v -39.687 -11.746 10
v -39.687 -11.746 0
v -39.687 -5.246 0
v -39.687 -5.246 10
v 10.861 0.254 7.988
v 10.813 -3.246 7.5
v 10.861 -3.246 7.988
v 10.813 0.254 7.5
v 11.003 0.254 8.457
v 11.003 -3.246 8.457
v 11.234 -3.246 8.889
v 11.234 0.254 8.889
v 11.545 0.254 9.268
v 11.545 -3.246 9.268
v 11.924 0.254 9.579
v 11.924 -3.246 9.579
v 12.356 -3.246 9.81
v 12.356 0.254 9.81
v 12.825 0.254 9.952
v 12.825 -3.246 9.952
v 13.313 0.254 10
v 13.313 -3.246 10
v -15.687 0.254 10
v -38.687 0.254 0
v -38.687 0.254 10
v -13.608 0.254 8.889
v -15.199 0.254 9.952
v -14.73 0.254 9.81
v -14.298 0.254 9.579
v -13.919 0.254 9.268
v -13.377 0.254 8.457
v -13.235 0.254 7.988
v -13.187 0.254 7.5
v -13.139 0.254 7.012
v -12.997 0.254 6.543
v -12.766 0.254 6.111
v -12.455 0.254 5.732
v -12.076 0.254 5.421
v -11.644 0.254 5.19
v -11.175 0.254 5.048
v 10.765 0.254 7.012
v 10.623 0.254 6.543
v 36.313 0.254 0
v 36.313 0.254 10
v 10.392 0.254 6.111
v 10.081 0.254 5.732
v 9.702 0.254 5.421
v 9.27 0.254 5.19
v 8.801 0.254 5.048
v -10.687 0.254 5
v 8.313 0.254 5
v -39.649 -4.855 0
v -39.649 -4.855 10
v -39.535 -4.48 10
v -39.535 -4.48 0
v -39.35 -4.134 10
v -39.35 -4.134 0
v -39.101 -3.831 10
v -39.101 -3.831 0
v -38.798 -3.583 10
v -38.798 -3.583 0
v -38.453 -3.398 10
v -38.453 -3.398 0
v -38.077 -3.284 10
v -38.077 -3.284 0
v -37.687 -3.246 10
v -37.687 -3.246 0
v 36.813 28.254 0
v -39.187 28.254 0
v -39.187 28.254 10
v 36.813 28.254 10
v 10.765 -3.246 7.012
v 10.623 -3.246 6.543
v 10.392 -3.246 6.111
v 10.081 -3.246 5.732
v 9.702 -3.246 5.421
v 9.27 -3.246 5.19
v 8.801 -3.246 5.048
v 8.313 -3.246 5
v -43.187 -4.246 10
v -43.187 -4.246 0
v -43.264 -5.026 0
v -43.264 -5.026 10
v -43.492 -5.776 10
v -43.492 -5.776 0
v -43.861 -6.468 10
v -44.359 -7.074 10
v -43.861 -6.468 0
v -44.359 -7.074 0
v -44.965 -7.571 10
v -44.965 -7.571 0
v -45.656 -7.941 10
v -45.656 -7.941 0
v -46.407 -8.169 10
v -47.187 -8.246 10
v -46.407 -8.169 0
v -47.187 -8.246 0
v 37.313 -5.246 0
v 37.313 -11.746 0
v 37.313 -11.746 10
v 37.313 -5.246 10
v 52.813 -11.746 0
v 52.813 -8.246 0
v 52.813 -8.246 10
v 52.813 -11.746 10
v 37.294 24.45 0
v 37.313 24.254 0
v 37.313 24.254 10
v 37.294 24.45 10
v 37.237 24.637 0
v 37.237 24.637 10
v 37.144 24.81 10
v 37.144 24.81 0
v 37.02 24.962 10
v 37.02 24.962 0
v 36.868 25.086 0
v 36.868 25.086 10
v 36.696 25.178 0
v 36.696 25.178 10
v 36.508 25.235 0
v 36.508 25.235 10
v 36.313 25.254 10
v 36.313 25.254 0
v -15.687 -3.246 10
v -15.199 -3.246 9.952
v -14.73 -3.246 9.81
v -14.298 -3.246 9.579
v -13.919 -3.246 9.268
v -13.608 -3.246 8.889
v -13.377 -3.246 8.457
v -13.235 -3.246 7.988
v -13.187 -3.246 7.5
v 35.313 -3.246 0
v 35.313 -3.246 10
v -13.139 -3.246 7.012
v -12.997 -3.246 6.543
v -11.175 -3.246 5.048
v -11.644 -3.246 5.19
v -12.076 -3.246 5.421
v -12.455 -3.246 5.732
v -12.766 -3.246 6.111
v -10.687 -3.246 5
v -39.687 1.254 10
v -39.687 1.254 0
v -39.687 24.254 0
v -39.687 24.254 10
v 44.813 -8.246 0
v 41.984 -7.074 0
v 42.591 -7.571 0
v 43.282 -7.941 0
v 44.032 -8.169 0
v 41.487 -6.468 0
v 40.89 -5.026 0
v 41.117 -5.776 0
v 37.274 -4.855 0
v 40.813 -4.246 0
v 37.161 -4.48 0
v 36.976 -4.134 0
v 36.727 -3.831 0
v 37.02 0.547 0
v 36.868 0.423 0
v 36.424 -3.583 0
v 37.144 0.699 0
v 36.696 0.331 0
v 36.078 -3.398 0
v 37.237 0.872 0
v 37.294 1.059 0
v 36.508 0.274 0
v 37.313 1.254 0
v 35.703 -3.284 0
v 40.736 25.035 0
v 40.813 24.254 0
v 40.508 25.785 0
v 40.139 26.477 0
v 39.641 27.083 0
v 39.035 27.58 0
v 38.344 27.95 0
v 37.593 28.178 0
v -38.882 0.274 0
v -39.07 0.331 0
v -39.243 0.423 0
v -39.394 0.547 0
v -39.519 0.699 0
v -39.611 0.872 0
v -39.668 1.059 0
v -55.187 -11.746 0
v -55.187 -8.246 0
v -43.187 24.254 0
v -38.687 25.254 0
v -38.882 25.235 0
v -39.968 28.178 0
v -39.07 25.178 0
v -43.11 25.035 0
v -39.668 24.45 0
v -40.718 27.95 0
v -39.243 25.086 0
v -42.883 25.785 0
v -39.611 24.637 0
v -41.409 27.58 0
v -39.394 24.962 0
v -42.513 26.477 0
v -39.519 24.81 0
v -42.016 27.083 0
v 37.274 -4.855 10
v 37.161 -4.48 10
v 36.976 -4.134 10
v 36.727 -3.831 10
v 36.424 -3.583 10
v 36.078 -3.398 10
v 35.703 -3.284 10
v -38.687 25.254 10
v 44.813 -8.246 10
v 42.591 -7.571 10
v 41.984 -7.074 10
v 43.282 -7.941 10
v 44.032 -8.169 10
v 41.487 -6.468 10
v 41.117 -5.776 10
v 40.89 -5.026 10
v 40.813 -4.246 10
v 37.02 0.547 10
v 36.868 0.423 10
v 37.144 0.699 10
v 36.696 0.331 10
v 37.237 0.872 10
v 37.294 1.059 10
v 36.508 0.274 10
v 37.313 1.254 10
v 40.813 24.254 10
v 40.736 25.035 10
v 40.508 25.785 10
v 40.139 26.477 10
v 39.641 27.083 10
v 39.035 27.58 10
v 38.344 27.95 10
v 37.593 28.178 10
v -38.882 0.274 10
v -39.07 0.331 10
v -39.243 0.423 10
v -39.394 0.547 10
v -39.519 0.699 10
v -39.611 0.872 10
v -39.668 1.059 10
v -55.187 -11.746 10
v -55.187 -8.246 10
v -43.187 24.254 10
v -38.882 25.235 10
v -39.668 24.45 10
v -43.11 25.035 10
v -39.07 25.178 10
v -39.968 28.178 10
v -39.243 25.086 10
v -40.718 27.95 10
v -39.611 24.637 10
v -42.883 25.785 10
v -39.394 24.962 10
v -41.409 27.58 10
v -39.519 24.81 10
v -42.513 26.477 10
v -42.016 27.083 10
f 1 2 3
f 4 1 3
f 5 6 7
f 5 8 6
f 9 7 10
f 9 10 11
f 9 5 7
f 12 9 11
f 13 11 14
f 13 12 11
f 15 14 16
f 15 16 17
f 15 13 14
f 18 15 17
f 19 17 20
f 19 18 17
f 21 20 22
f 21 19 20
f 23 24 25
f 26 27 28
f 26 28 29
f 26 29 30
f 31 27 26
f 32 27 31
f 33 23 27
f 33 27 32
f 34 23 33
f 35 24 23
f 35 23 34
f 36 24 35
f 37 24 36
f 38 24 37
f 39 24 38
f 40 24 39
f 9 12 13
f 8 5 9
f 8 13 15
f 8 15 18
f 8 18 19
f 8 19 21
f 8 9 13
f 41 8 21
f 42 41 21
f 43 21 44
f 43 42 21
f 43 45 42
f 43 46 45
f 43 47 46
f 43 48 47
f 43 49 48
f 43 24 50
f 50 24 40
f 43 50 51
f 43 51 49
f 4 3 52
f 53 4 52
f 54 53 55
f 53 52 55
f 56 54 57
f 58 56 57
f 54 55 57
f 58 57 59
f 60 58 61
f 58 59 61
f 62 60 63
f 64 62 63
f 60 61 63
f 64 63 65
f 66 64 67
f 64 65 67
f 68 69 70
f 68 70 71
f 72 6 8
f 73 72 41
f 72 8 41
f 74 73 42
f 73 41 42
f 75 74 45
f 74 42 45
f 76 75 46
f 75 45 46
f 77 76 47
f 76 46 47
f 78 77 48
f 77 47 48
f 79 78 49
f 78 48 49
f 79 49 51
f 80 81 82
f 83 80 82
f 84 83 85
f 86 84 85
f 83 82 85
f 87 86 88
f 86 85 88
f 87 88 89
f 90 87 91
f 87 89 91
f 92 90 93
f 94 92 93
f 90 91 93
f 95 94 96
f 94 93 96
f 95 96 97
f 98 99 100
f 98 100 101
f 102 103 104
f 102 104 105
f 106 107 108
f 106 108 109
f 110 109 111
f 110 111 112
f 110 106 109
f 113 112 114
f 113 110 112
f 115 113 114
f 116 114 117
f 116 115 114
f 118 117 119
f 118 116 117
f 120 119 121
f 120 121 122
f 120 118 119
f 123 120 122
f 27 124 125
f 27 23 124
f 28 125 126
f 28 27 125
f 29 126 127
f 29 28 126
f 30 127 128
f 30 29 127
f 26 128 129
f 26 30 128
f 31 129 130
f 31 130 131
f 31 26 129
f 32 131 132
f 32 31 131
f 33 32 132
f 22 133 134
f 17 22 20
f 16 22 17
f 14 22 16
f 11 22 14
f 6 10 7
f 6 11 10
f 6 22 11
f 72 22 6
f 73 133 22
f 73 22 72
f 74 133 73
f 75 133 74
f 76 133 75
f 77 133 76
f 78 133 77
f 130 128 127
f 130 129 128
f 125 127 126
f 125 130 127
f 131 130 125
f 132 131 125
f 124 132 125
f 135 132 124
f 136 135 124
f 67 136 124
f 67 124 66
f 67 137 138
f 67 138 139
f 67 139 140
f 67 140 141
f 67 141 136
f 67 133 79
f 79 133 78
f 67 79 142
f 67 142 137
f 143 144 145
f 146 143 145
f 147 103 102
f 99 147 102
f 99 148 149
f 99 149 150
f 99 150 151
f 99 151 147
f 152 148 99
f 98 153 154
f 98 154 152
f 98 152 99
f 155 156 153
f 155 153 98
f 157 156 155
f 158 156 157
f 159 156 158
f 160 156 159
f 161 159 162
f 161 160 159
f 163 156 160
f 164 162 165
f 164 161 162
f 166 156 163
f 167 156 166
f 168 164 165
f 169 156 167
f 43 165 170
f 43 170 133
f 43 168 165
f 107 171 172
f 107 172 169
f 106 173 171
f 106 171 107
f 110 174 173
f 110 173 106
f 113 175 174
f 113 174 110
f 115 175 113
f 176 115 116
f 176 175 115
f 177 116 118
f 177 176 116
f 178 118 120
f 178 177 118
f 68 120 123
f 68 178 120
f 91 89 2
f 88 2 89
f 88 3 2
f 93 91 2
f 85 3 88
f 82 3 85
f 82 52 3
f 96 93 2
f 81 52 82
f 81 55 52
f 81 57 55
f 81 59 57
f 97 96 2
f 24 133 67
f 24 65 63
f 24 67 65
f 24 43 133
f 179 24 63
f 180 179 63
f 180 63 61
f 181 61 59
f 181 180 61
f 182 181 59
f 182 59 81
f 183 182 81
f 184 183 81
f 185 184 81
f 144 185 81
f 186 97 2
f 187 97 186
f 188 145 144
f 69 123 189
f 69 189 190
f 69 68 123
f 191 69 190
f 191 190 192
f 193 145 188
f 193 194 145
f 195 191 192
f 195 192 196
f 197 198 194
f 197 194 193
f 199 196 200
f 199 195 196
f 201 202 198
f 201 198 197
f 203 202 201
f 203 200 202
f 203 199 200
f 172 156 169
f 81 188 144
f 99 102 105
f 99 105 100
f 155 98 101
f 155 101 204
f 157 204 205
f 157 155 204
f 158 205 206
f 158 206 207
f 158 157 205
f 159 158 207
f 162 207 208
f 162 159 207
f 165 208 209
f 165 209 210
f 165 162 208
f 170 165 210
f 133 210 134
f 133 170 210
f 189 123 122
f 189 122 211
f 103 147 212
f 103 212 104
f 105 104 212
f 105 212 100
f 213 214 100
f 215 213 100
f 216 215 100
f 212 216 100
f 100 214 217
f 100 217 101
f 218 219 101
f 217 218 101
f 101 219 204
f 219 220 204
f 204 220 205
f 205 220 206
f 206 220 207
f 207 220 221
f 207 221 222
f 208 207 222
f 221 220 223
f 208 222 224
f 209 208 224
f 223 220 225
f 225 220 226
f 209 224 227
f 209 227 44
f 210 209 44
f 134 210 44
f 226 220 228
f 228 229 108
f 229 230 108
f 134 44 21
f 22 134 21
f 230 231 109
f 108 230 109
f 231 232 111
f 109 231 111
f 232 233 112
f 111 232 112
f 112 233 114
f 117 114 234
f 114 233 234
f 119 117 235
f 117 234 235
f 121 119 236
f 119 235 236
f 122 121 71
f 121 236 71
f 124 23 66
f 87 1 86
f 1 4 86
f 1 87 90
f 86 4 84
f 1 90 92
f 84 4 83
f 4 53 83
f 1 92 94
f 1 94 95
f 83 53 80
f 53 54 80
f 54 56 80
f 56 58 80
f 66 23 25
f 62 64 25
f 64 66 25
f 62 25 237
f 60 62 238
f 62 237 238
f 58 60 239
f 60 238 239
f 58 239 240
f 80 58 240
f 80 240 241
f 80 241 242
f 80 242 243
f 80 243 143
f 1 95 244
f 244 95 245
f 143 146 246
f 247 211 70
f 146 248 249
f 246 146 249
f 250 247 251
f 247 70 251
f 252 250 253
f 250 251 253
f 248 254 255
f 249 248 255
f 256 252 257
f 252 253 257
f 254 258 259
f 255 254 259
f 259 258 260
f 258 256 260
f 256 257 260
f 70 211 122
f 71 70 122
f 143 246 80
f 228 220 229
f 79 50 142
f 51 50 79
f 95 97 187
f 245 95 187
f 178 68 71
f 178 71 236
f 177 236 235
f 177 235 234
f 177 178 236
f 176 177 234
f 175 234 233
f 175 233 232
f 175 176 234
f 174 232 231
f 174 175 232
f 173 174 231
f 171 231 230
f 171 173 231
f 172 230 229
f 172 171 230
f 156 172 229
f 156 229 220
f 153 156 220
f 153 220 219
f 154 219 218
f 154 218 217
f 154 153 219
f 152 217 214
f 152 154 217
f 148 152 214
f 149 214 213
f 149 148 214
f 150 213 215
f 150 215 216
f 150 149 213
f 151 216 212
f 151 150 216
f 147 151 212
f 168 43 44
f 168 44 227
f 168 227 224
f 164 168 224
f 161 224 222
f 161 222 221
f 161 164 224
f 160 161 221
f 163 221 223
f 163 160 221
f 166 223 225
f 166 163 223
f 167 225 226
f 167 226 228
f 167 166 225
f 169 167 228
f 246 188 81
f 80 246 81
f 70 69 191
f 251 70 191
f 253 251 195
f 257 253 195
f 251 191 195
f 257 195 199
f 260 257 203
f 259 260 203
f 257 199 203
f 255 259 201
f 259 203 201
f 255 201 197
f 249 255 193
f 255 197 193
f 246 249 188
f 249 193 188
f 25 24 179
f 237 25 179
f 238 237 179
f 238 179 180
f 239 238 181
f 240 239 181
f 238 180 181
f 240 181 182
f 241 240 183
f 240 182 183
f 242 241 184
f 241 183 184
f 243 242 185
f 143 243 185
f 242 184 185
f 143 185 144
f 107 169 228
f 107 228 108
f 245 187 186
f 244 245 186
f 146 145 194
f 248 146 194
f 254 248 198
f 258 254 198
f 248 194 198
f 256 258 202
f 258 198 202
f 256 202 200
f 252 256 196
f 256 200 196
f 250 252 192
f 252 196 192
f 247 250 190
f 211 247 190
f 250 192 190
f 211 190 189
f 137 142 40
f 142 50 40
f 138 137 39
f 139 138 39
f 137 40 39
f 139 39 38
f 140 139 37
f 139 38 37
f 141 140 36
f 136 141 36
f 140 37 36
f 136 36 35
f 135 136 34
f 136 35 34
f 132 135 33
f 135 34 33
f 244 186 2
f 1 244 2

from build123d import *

# Parameters (mm, degrees)
SALIENTE_EXTRUIR2_DEPTH = 10
CROQUIS9_W              = 24
CROQUIS9_H              = 7
CORTAR_EXTRUIR2_DEPTH   = 5
REDONDEO3_R             = 2.5


with BuildPart() as part:
    # Croquis1 → Saliente-Extruir2 (new body)
    with BuildSketch(Plane.XY):
        with BuildLine():
            ThreePointArc((-38.687161159, 0.254415054), (-39.39426794, 0.547308273), (-39.687161159, 1.254415054))
            Line((-39.687161159, 1.254415054), (-39.687161159, 24.254415054))
            ThreePointArc((-39.687161159, 24.254415054), (-39.39426794, 24.961521836), (-38.687161159, 25.254415054))
            Line((-38.687161159, 25.254415054), (-1.187161159, 25.254415054))
            Line((-1.187161159, 25.254415054), (-1.187161159, 28.254415054))
            Line((-1.187161159, 28.254415054), (-39.187161159, 28.254415054))
            ThreePointArc((-39.187161159, 28.254415054), (-42.015588284, 27.082842179), (-43.187161159, 24.254415054))
            Line((-43.187161159, 24.254415054), (-43.187161159, -3.245584946))
            Line((-43.187161159, -3.245584946), (-43.187161159, -4.245584946))
            ThreePointArc((-43.187161159, -4.245584946), (-44.358734034, -7.07401207), (-47.187161159, -8.245584946))
            Line((-47.187161159, -8.245584946), (-55.187161159, -8.245584946))
            Line((-55.187161159, -8.245584946), (-55.187161159, -11.745584946))
            Line((-55.187161159, -11.745584946), (-43.187161159, -11.745584946))
            Line((-43.187161159, -11.745584946), (-39.687161159, -11.745584946))
            Line((-39.687161159, -11.745584946), (-39.687161159, -5.245584946))
            ThreePointArc((-39.687161159, -5.245584946), (-39.101374721, -3.831371383), (-37.687161159, -3.245584946))
            Line((-37.687161159, -3.245584946), (-1.187161159, -3.245584946))
            Line((-1.187161159, -3.245584946), (-1.187161159, 0.254415054))
            Line((-1.187161159, 0.254415054), (-38.687161159, 0.254415054))
        make_face()
    saliente_extruir2 = extrude(amount=SALIENTE_EXTRUIR2_DEPTH)

    # Simetría2: Saliente-Extruir2 across plane
    add(saliente_extruir2.mirror(Plane(origin=(-1.187161159, 0, 10), x_dir=(0, 0, 1), z_dir=(-1, 0, 0))))

    # Croquis9 → Cortar-Extruir2 (cut)
    with BuildSketch(Plane.XY.offset(10)):
        with Locations((-1.187161159, -3.245584946)):
            Rectangle(CROQUIS9_W, CROQUIS9_H)
    extrude(amount=-CORTAR_EXTRUIR2_DEPTH, mode=Mode.SUBTRACT)

    # Redondeo3
    redondeo3_edges = [part.edges().sort_by_distance(p)[0] for p in [
        (10.812838841, -1.495584946, 5),
        (-13.187161159, -1.495584946, 5),
    ]]
    fillet(redondeo3_edges, radius=REDONDEO3_R)
    redondeo3_2_edges = [part.edges().sort_by_distance(p)[0] for p in [
        (10.812838841, -1.495584946, 10),
        (-13.187161159, -1.495584946, 10),
    ]]
    fillet(redondeo3_2_edges, radius=REDONDEO3_R - 0.0001)  # a hair under: the kernel refuses the full size


solid = part.part
